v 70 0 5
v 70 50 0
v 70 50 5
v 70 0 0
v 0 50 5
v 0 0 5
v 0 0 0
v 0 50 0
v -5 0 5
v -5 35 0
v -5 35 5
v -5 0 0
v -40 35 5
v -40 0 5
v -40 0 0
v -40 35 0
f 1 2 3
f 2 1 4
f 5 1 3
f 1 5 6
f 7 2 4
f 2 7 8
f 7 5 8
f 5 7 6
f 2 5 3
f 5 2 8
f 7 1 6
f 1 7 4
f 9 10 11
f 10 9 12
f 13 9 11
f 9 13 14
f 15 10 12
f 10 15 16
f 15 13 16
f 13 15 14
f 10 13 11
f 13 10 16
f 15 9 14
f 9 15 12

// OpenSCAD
h=5;

cube([70, 50, h]);

translate([-40, 0, 0])
  cube([35, 35, h]);
